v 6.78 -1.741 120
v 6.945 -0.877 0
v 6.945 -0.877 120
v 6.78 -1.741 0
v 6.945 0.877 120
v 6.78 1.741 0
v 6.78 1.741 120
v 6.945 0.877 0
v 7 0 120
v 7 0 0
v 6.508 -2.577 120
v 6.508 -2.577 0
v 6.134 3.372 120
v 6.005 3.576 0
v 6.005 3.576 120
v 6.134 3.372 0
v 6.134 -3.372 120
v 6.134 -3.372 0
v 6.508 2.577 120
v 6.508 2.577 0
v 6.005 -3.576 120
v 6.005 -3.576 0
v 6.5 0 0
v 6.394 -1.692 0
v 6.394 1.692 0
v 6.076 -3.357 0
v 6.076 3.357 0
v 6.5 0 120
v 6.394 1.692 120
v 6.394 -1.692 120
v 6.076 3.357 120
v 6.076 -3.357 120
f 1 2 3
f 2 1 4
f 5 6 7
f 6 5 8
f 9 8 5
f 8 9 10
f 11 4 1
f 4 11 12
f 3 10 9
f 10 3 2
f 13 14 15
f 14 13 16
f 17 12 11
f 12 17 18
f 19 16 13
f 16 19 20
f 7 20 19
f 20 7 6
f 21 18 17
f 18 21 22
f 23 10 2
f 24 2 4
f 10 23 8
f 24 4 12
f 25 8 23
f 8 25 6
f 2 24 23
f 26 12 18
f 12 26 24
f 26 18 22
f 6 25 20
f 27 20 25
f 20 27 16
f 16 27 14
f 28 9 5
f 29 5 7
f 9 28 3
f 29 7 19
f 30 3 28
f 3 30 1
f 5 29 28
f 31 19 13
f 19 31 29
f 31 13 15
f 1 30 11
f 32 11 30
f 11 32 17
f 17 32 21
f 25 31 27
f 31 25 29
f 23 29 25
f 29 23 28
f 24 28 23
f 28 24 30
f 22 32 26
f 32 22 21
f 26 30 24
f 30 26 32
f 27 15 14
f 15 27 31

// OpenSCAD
$fn = 50;


difference() {
	union() {
		cylinder(h = 120, r = 7.0000000000);
		translate(v = [-10.0000000000, 0, 0]) {
			cylinder(h = 120, r = 7.0000000000);
		}
	}
	union() {
		cylinder(h = 120, r = 3.2500000000);
		cylinder(h = 120, r = 1.8000000000);
		cylinder(h = 120, r = 1.8000000000);
		cylinder(h = 120, r = 1.8000000000);
		translate(v = [-14.5000000000, 0, 0]) {
			hull() {
				translate(v = [-3.7500000000, 0.0000000000, 0]) {
					cylinder(h = 120, r = 7.5000000000);
				}
				translate(v = [3.7500000000, 0.0000000000, 0]) {
					cylinder(h = 120, r = 7.5000000000);
				}
				translate(v = [-3.7500000000, -0.0000000000, 0]) {
					cylinder(h = 120, r = 7.5000000000);
				}
				translate(v = [3.7500000000, -0.0000000000, 0]) {
					cylinder(h = 120, r = 7.5000000000);
				}
			}
		}
		translate(v = [-7.0000000000, 0, 0.0000000000]) {
			cylinder(h = 120, r = 13.5000000000);
		}
	}
}
